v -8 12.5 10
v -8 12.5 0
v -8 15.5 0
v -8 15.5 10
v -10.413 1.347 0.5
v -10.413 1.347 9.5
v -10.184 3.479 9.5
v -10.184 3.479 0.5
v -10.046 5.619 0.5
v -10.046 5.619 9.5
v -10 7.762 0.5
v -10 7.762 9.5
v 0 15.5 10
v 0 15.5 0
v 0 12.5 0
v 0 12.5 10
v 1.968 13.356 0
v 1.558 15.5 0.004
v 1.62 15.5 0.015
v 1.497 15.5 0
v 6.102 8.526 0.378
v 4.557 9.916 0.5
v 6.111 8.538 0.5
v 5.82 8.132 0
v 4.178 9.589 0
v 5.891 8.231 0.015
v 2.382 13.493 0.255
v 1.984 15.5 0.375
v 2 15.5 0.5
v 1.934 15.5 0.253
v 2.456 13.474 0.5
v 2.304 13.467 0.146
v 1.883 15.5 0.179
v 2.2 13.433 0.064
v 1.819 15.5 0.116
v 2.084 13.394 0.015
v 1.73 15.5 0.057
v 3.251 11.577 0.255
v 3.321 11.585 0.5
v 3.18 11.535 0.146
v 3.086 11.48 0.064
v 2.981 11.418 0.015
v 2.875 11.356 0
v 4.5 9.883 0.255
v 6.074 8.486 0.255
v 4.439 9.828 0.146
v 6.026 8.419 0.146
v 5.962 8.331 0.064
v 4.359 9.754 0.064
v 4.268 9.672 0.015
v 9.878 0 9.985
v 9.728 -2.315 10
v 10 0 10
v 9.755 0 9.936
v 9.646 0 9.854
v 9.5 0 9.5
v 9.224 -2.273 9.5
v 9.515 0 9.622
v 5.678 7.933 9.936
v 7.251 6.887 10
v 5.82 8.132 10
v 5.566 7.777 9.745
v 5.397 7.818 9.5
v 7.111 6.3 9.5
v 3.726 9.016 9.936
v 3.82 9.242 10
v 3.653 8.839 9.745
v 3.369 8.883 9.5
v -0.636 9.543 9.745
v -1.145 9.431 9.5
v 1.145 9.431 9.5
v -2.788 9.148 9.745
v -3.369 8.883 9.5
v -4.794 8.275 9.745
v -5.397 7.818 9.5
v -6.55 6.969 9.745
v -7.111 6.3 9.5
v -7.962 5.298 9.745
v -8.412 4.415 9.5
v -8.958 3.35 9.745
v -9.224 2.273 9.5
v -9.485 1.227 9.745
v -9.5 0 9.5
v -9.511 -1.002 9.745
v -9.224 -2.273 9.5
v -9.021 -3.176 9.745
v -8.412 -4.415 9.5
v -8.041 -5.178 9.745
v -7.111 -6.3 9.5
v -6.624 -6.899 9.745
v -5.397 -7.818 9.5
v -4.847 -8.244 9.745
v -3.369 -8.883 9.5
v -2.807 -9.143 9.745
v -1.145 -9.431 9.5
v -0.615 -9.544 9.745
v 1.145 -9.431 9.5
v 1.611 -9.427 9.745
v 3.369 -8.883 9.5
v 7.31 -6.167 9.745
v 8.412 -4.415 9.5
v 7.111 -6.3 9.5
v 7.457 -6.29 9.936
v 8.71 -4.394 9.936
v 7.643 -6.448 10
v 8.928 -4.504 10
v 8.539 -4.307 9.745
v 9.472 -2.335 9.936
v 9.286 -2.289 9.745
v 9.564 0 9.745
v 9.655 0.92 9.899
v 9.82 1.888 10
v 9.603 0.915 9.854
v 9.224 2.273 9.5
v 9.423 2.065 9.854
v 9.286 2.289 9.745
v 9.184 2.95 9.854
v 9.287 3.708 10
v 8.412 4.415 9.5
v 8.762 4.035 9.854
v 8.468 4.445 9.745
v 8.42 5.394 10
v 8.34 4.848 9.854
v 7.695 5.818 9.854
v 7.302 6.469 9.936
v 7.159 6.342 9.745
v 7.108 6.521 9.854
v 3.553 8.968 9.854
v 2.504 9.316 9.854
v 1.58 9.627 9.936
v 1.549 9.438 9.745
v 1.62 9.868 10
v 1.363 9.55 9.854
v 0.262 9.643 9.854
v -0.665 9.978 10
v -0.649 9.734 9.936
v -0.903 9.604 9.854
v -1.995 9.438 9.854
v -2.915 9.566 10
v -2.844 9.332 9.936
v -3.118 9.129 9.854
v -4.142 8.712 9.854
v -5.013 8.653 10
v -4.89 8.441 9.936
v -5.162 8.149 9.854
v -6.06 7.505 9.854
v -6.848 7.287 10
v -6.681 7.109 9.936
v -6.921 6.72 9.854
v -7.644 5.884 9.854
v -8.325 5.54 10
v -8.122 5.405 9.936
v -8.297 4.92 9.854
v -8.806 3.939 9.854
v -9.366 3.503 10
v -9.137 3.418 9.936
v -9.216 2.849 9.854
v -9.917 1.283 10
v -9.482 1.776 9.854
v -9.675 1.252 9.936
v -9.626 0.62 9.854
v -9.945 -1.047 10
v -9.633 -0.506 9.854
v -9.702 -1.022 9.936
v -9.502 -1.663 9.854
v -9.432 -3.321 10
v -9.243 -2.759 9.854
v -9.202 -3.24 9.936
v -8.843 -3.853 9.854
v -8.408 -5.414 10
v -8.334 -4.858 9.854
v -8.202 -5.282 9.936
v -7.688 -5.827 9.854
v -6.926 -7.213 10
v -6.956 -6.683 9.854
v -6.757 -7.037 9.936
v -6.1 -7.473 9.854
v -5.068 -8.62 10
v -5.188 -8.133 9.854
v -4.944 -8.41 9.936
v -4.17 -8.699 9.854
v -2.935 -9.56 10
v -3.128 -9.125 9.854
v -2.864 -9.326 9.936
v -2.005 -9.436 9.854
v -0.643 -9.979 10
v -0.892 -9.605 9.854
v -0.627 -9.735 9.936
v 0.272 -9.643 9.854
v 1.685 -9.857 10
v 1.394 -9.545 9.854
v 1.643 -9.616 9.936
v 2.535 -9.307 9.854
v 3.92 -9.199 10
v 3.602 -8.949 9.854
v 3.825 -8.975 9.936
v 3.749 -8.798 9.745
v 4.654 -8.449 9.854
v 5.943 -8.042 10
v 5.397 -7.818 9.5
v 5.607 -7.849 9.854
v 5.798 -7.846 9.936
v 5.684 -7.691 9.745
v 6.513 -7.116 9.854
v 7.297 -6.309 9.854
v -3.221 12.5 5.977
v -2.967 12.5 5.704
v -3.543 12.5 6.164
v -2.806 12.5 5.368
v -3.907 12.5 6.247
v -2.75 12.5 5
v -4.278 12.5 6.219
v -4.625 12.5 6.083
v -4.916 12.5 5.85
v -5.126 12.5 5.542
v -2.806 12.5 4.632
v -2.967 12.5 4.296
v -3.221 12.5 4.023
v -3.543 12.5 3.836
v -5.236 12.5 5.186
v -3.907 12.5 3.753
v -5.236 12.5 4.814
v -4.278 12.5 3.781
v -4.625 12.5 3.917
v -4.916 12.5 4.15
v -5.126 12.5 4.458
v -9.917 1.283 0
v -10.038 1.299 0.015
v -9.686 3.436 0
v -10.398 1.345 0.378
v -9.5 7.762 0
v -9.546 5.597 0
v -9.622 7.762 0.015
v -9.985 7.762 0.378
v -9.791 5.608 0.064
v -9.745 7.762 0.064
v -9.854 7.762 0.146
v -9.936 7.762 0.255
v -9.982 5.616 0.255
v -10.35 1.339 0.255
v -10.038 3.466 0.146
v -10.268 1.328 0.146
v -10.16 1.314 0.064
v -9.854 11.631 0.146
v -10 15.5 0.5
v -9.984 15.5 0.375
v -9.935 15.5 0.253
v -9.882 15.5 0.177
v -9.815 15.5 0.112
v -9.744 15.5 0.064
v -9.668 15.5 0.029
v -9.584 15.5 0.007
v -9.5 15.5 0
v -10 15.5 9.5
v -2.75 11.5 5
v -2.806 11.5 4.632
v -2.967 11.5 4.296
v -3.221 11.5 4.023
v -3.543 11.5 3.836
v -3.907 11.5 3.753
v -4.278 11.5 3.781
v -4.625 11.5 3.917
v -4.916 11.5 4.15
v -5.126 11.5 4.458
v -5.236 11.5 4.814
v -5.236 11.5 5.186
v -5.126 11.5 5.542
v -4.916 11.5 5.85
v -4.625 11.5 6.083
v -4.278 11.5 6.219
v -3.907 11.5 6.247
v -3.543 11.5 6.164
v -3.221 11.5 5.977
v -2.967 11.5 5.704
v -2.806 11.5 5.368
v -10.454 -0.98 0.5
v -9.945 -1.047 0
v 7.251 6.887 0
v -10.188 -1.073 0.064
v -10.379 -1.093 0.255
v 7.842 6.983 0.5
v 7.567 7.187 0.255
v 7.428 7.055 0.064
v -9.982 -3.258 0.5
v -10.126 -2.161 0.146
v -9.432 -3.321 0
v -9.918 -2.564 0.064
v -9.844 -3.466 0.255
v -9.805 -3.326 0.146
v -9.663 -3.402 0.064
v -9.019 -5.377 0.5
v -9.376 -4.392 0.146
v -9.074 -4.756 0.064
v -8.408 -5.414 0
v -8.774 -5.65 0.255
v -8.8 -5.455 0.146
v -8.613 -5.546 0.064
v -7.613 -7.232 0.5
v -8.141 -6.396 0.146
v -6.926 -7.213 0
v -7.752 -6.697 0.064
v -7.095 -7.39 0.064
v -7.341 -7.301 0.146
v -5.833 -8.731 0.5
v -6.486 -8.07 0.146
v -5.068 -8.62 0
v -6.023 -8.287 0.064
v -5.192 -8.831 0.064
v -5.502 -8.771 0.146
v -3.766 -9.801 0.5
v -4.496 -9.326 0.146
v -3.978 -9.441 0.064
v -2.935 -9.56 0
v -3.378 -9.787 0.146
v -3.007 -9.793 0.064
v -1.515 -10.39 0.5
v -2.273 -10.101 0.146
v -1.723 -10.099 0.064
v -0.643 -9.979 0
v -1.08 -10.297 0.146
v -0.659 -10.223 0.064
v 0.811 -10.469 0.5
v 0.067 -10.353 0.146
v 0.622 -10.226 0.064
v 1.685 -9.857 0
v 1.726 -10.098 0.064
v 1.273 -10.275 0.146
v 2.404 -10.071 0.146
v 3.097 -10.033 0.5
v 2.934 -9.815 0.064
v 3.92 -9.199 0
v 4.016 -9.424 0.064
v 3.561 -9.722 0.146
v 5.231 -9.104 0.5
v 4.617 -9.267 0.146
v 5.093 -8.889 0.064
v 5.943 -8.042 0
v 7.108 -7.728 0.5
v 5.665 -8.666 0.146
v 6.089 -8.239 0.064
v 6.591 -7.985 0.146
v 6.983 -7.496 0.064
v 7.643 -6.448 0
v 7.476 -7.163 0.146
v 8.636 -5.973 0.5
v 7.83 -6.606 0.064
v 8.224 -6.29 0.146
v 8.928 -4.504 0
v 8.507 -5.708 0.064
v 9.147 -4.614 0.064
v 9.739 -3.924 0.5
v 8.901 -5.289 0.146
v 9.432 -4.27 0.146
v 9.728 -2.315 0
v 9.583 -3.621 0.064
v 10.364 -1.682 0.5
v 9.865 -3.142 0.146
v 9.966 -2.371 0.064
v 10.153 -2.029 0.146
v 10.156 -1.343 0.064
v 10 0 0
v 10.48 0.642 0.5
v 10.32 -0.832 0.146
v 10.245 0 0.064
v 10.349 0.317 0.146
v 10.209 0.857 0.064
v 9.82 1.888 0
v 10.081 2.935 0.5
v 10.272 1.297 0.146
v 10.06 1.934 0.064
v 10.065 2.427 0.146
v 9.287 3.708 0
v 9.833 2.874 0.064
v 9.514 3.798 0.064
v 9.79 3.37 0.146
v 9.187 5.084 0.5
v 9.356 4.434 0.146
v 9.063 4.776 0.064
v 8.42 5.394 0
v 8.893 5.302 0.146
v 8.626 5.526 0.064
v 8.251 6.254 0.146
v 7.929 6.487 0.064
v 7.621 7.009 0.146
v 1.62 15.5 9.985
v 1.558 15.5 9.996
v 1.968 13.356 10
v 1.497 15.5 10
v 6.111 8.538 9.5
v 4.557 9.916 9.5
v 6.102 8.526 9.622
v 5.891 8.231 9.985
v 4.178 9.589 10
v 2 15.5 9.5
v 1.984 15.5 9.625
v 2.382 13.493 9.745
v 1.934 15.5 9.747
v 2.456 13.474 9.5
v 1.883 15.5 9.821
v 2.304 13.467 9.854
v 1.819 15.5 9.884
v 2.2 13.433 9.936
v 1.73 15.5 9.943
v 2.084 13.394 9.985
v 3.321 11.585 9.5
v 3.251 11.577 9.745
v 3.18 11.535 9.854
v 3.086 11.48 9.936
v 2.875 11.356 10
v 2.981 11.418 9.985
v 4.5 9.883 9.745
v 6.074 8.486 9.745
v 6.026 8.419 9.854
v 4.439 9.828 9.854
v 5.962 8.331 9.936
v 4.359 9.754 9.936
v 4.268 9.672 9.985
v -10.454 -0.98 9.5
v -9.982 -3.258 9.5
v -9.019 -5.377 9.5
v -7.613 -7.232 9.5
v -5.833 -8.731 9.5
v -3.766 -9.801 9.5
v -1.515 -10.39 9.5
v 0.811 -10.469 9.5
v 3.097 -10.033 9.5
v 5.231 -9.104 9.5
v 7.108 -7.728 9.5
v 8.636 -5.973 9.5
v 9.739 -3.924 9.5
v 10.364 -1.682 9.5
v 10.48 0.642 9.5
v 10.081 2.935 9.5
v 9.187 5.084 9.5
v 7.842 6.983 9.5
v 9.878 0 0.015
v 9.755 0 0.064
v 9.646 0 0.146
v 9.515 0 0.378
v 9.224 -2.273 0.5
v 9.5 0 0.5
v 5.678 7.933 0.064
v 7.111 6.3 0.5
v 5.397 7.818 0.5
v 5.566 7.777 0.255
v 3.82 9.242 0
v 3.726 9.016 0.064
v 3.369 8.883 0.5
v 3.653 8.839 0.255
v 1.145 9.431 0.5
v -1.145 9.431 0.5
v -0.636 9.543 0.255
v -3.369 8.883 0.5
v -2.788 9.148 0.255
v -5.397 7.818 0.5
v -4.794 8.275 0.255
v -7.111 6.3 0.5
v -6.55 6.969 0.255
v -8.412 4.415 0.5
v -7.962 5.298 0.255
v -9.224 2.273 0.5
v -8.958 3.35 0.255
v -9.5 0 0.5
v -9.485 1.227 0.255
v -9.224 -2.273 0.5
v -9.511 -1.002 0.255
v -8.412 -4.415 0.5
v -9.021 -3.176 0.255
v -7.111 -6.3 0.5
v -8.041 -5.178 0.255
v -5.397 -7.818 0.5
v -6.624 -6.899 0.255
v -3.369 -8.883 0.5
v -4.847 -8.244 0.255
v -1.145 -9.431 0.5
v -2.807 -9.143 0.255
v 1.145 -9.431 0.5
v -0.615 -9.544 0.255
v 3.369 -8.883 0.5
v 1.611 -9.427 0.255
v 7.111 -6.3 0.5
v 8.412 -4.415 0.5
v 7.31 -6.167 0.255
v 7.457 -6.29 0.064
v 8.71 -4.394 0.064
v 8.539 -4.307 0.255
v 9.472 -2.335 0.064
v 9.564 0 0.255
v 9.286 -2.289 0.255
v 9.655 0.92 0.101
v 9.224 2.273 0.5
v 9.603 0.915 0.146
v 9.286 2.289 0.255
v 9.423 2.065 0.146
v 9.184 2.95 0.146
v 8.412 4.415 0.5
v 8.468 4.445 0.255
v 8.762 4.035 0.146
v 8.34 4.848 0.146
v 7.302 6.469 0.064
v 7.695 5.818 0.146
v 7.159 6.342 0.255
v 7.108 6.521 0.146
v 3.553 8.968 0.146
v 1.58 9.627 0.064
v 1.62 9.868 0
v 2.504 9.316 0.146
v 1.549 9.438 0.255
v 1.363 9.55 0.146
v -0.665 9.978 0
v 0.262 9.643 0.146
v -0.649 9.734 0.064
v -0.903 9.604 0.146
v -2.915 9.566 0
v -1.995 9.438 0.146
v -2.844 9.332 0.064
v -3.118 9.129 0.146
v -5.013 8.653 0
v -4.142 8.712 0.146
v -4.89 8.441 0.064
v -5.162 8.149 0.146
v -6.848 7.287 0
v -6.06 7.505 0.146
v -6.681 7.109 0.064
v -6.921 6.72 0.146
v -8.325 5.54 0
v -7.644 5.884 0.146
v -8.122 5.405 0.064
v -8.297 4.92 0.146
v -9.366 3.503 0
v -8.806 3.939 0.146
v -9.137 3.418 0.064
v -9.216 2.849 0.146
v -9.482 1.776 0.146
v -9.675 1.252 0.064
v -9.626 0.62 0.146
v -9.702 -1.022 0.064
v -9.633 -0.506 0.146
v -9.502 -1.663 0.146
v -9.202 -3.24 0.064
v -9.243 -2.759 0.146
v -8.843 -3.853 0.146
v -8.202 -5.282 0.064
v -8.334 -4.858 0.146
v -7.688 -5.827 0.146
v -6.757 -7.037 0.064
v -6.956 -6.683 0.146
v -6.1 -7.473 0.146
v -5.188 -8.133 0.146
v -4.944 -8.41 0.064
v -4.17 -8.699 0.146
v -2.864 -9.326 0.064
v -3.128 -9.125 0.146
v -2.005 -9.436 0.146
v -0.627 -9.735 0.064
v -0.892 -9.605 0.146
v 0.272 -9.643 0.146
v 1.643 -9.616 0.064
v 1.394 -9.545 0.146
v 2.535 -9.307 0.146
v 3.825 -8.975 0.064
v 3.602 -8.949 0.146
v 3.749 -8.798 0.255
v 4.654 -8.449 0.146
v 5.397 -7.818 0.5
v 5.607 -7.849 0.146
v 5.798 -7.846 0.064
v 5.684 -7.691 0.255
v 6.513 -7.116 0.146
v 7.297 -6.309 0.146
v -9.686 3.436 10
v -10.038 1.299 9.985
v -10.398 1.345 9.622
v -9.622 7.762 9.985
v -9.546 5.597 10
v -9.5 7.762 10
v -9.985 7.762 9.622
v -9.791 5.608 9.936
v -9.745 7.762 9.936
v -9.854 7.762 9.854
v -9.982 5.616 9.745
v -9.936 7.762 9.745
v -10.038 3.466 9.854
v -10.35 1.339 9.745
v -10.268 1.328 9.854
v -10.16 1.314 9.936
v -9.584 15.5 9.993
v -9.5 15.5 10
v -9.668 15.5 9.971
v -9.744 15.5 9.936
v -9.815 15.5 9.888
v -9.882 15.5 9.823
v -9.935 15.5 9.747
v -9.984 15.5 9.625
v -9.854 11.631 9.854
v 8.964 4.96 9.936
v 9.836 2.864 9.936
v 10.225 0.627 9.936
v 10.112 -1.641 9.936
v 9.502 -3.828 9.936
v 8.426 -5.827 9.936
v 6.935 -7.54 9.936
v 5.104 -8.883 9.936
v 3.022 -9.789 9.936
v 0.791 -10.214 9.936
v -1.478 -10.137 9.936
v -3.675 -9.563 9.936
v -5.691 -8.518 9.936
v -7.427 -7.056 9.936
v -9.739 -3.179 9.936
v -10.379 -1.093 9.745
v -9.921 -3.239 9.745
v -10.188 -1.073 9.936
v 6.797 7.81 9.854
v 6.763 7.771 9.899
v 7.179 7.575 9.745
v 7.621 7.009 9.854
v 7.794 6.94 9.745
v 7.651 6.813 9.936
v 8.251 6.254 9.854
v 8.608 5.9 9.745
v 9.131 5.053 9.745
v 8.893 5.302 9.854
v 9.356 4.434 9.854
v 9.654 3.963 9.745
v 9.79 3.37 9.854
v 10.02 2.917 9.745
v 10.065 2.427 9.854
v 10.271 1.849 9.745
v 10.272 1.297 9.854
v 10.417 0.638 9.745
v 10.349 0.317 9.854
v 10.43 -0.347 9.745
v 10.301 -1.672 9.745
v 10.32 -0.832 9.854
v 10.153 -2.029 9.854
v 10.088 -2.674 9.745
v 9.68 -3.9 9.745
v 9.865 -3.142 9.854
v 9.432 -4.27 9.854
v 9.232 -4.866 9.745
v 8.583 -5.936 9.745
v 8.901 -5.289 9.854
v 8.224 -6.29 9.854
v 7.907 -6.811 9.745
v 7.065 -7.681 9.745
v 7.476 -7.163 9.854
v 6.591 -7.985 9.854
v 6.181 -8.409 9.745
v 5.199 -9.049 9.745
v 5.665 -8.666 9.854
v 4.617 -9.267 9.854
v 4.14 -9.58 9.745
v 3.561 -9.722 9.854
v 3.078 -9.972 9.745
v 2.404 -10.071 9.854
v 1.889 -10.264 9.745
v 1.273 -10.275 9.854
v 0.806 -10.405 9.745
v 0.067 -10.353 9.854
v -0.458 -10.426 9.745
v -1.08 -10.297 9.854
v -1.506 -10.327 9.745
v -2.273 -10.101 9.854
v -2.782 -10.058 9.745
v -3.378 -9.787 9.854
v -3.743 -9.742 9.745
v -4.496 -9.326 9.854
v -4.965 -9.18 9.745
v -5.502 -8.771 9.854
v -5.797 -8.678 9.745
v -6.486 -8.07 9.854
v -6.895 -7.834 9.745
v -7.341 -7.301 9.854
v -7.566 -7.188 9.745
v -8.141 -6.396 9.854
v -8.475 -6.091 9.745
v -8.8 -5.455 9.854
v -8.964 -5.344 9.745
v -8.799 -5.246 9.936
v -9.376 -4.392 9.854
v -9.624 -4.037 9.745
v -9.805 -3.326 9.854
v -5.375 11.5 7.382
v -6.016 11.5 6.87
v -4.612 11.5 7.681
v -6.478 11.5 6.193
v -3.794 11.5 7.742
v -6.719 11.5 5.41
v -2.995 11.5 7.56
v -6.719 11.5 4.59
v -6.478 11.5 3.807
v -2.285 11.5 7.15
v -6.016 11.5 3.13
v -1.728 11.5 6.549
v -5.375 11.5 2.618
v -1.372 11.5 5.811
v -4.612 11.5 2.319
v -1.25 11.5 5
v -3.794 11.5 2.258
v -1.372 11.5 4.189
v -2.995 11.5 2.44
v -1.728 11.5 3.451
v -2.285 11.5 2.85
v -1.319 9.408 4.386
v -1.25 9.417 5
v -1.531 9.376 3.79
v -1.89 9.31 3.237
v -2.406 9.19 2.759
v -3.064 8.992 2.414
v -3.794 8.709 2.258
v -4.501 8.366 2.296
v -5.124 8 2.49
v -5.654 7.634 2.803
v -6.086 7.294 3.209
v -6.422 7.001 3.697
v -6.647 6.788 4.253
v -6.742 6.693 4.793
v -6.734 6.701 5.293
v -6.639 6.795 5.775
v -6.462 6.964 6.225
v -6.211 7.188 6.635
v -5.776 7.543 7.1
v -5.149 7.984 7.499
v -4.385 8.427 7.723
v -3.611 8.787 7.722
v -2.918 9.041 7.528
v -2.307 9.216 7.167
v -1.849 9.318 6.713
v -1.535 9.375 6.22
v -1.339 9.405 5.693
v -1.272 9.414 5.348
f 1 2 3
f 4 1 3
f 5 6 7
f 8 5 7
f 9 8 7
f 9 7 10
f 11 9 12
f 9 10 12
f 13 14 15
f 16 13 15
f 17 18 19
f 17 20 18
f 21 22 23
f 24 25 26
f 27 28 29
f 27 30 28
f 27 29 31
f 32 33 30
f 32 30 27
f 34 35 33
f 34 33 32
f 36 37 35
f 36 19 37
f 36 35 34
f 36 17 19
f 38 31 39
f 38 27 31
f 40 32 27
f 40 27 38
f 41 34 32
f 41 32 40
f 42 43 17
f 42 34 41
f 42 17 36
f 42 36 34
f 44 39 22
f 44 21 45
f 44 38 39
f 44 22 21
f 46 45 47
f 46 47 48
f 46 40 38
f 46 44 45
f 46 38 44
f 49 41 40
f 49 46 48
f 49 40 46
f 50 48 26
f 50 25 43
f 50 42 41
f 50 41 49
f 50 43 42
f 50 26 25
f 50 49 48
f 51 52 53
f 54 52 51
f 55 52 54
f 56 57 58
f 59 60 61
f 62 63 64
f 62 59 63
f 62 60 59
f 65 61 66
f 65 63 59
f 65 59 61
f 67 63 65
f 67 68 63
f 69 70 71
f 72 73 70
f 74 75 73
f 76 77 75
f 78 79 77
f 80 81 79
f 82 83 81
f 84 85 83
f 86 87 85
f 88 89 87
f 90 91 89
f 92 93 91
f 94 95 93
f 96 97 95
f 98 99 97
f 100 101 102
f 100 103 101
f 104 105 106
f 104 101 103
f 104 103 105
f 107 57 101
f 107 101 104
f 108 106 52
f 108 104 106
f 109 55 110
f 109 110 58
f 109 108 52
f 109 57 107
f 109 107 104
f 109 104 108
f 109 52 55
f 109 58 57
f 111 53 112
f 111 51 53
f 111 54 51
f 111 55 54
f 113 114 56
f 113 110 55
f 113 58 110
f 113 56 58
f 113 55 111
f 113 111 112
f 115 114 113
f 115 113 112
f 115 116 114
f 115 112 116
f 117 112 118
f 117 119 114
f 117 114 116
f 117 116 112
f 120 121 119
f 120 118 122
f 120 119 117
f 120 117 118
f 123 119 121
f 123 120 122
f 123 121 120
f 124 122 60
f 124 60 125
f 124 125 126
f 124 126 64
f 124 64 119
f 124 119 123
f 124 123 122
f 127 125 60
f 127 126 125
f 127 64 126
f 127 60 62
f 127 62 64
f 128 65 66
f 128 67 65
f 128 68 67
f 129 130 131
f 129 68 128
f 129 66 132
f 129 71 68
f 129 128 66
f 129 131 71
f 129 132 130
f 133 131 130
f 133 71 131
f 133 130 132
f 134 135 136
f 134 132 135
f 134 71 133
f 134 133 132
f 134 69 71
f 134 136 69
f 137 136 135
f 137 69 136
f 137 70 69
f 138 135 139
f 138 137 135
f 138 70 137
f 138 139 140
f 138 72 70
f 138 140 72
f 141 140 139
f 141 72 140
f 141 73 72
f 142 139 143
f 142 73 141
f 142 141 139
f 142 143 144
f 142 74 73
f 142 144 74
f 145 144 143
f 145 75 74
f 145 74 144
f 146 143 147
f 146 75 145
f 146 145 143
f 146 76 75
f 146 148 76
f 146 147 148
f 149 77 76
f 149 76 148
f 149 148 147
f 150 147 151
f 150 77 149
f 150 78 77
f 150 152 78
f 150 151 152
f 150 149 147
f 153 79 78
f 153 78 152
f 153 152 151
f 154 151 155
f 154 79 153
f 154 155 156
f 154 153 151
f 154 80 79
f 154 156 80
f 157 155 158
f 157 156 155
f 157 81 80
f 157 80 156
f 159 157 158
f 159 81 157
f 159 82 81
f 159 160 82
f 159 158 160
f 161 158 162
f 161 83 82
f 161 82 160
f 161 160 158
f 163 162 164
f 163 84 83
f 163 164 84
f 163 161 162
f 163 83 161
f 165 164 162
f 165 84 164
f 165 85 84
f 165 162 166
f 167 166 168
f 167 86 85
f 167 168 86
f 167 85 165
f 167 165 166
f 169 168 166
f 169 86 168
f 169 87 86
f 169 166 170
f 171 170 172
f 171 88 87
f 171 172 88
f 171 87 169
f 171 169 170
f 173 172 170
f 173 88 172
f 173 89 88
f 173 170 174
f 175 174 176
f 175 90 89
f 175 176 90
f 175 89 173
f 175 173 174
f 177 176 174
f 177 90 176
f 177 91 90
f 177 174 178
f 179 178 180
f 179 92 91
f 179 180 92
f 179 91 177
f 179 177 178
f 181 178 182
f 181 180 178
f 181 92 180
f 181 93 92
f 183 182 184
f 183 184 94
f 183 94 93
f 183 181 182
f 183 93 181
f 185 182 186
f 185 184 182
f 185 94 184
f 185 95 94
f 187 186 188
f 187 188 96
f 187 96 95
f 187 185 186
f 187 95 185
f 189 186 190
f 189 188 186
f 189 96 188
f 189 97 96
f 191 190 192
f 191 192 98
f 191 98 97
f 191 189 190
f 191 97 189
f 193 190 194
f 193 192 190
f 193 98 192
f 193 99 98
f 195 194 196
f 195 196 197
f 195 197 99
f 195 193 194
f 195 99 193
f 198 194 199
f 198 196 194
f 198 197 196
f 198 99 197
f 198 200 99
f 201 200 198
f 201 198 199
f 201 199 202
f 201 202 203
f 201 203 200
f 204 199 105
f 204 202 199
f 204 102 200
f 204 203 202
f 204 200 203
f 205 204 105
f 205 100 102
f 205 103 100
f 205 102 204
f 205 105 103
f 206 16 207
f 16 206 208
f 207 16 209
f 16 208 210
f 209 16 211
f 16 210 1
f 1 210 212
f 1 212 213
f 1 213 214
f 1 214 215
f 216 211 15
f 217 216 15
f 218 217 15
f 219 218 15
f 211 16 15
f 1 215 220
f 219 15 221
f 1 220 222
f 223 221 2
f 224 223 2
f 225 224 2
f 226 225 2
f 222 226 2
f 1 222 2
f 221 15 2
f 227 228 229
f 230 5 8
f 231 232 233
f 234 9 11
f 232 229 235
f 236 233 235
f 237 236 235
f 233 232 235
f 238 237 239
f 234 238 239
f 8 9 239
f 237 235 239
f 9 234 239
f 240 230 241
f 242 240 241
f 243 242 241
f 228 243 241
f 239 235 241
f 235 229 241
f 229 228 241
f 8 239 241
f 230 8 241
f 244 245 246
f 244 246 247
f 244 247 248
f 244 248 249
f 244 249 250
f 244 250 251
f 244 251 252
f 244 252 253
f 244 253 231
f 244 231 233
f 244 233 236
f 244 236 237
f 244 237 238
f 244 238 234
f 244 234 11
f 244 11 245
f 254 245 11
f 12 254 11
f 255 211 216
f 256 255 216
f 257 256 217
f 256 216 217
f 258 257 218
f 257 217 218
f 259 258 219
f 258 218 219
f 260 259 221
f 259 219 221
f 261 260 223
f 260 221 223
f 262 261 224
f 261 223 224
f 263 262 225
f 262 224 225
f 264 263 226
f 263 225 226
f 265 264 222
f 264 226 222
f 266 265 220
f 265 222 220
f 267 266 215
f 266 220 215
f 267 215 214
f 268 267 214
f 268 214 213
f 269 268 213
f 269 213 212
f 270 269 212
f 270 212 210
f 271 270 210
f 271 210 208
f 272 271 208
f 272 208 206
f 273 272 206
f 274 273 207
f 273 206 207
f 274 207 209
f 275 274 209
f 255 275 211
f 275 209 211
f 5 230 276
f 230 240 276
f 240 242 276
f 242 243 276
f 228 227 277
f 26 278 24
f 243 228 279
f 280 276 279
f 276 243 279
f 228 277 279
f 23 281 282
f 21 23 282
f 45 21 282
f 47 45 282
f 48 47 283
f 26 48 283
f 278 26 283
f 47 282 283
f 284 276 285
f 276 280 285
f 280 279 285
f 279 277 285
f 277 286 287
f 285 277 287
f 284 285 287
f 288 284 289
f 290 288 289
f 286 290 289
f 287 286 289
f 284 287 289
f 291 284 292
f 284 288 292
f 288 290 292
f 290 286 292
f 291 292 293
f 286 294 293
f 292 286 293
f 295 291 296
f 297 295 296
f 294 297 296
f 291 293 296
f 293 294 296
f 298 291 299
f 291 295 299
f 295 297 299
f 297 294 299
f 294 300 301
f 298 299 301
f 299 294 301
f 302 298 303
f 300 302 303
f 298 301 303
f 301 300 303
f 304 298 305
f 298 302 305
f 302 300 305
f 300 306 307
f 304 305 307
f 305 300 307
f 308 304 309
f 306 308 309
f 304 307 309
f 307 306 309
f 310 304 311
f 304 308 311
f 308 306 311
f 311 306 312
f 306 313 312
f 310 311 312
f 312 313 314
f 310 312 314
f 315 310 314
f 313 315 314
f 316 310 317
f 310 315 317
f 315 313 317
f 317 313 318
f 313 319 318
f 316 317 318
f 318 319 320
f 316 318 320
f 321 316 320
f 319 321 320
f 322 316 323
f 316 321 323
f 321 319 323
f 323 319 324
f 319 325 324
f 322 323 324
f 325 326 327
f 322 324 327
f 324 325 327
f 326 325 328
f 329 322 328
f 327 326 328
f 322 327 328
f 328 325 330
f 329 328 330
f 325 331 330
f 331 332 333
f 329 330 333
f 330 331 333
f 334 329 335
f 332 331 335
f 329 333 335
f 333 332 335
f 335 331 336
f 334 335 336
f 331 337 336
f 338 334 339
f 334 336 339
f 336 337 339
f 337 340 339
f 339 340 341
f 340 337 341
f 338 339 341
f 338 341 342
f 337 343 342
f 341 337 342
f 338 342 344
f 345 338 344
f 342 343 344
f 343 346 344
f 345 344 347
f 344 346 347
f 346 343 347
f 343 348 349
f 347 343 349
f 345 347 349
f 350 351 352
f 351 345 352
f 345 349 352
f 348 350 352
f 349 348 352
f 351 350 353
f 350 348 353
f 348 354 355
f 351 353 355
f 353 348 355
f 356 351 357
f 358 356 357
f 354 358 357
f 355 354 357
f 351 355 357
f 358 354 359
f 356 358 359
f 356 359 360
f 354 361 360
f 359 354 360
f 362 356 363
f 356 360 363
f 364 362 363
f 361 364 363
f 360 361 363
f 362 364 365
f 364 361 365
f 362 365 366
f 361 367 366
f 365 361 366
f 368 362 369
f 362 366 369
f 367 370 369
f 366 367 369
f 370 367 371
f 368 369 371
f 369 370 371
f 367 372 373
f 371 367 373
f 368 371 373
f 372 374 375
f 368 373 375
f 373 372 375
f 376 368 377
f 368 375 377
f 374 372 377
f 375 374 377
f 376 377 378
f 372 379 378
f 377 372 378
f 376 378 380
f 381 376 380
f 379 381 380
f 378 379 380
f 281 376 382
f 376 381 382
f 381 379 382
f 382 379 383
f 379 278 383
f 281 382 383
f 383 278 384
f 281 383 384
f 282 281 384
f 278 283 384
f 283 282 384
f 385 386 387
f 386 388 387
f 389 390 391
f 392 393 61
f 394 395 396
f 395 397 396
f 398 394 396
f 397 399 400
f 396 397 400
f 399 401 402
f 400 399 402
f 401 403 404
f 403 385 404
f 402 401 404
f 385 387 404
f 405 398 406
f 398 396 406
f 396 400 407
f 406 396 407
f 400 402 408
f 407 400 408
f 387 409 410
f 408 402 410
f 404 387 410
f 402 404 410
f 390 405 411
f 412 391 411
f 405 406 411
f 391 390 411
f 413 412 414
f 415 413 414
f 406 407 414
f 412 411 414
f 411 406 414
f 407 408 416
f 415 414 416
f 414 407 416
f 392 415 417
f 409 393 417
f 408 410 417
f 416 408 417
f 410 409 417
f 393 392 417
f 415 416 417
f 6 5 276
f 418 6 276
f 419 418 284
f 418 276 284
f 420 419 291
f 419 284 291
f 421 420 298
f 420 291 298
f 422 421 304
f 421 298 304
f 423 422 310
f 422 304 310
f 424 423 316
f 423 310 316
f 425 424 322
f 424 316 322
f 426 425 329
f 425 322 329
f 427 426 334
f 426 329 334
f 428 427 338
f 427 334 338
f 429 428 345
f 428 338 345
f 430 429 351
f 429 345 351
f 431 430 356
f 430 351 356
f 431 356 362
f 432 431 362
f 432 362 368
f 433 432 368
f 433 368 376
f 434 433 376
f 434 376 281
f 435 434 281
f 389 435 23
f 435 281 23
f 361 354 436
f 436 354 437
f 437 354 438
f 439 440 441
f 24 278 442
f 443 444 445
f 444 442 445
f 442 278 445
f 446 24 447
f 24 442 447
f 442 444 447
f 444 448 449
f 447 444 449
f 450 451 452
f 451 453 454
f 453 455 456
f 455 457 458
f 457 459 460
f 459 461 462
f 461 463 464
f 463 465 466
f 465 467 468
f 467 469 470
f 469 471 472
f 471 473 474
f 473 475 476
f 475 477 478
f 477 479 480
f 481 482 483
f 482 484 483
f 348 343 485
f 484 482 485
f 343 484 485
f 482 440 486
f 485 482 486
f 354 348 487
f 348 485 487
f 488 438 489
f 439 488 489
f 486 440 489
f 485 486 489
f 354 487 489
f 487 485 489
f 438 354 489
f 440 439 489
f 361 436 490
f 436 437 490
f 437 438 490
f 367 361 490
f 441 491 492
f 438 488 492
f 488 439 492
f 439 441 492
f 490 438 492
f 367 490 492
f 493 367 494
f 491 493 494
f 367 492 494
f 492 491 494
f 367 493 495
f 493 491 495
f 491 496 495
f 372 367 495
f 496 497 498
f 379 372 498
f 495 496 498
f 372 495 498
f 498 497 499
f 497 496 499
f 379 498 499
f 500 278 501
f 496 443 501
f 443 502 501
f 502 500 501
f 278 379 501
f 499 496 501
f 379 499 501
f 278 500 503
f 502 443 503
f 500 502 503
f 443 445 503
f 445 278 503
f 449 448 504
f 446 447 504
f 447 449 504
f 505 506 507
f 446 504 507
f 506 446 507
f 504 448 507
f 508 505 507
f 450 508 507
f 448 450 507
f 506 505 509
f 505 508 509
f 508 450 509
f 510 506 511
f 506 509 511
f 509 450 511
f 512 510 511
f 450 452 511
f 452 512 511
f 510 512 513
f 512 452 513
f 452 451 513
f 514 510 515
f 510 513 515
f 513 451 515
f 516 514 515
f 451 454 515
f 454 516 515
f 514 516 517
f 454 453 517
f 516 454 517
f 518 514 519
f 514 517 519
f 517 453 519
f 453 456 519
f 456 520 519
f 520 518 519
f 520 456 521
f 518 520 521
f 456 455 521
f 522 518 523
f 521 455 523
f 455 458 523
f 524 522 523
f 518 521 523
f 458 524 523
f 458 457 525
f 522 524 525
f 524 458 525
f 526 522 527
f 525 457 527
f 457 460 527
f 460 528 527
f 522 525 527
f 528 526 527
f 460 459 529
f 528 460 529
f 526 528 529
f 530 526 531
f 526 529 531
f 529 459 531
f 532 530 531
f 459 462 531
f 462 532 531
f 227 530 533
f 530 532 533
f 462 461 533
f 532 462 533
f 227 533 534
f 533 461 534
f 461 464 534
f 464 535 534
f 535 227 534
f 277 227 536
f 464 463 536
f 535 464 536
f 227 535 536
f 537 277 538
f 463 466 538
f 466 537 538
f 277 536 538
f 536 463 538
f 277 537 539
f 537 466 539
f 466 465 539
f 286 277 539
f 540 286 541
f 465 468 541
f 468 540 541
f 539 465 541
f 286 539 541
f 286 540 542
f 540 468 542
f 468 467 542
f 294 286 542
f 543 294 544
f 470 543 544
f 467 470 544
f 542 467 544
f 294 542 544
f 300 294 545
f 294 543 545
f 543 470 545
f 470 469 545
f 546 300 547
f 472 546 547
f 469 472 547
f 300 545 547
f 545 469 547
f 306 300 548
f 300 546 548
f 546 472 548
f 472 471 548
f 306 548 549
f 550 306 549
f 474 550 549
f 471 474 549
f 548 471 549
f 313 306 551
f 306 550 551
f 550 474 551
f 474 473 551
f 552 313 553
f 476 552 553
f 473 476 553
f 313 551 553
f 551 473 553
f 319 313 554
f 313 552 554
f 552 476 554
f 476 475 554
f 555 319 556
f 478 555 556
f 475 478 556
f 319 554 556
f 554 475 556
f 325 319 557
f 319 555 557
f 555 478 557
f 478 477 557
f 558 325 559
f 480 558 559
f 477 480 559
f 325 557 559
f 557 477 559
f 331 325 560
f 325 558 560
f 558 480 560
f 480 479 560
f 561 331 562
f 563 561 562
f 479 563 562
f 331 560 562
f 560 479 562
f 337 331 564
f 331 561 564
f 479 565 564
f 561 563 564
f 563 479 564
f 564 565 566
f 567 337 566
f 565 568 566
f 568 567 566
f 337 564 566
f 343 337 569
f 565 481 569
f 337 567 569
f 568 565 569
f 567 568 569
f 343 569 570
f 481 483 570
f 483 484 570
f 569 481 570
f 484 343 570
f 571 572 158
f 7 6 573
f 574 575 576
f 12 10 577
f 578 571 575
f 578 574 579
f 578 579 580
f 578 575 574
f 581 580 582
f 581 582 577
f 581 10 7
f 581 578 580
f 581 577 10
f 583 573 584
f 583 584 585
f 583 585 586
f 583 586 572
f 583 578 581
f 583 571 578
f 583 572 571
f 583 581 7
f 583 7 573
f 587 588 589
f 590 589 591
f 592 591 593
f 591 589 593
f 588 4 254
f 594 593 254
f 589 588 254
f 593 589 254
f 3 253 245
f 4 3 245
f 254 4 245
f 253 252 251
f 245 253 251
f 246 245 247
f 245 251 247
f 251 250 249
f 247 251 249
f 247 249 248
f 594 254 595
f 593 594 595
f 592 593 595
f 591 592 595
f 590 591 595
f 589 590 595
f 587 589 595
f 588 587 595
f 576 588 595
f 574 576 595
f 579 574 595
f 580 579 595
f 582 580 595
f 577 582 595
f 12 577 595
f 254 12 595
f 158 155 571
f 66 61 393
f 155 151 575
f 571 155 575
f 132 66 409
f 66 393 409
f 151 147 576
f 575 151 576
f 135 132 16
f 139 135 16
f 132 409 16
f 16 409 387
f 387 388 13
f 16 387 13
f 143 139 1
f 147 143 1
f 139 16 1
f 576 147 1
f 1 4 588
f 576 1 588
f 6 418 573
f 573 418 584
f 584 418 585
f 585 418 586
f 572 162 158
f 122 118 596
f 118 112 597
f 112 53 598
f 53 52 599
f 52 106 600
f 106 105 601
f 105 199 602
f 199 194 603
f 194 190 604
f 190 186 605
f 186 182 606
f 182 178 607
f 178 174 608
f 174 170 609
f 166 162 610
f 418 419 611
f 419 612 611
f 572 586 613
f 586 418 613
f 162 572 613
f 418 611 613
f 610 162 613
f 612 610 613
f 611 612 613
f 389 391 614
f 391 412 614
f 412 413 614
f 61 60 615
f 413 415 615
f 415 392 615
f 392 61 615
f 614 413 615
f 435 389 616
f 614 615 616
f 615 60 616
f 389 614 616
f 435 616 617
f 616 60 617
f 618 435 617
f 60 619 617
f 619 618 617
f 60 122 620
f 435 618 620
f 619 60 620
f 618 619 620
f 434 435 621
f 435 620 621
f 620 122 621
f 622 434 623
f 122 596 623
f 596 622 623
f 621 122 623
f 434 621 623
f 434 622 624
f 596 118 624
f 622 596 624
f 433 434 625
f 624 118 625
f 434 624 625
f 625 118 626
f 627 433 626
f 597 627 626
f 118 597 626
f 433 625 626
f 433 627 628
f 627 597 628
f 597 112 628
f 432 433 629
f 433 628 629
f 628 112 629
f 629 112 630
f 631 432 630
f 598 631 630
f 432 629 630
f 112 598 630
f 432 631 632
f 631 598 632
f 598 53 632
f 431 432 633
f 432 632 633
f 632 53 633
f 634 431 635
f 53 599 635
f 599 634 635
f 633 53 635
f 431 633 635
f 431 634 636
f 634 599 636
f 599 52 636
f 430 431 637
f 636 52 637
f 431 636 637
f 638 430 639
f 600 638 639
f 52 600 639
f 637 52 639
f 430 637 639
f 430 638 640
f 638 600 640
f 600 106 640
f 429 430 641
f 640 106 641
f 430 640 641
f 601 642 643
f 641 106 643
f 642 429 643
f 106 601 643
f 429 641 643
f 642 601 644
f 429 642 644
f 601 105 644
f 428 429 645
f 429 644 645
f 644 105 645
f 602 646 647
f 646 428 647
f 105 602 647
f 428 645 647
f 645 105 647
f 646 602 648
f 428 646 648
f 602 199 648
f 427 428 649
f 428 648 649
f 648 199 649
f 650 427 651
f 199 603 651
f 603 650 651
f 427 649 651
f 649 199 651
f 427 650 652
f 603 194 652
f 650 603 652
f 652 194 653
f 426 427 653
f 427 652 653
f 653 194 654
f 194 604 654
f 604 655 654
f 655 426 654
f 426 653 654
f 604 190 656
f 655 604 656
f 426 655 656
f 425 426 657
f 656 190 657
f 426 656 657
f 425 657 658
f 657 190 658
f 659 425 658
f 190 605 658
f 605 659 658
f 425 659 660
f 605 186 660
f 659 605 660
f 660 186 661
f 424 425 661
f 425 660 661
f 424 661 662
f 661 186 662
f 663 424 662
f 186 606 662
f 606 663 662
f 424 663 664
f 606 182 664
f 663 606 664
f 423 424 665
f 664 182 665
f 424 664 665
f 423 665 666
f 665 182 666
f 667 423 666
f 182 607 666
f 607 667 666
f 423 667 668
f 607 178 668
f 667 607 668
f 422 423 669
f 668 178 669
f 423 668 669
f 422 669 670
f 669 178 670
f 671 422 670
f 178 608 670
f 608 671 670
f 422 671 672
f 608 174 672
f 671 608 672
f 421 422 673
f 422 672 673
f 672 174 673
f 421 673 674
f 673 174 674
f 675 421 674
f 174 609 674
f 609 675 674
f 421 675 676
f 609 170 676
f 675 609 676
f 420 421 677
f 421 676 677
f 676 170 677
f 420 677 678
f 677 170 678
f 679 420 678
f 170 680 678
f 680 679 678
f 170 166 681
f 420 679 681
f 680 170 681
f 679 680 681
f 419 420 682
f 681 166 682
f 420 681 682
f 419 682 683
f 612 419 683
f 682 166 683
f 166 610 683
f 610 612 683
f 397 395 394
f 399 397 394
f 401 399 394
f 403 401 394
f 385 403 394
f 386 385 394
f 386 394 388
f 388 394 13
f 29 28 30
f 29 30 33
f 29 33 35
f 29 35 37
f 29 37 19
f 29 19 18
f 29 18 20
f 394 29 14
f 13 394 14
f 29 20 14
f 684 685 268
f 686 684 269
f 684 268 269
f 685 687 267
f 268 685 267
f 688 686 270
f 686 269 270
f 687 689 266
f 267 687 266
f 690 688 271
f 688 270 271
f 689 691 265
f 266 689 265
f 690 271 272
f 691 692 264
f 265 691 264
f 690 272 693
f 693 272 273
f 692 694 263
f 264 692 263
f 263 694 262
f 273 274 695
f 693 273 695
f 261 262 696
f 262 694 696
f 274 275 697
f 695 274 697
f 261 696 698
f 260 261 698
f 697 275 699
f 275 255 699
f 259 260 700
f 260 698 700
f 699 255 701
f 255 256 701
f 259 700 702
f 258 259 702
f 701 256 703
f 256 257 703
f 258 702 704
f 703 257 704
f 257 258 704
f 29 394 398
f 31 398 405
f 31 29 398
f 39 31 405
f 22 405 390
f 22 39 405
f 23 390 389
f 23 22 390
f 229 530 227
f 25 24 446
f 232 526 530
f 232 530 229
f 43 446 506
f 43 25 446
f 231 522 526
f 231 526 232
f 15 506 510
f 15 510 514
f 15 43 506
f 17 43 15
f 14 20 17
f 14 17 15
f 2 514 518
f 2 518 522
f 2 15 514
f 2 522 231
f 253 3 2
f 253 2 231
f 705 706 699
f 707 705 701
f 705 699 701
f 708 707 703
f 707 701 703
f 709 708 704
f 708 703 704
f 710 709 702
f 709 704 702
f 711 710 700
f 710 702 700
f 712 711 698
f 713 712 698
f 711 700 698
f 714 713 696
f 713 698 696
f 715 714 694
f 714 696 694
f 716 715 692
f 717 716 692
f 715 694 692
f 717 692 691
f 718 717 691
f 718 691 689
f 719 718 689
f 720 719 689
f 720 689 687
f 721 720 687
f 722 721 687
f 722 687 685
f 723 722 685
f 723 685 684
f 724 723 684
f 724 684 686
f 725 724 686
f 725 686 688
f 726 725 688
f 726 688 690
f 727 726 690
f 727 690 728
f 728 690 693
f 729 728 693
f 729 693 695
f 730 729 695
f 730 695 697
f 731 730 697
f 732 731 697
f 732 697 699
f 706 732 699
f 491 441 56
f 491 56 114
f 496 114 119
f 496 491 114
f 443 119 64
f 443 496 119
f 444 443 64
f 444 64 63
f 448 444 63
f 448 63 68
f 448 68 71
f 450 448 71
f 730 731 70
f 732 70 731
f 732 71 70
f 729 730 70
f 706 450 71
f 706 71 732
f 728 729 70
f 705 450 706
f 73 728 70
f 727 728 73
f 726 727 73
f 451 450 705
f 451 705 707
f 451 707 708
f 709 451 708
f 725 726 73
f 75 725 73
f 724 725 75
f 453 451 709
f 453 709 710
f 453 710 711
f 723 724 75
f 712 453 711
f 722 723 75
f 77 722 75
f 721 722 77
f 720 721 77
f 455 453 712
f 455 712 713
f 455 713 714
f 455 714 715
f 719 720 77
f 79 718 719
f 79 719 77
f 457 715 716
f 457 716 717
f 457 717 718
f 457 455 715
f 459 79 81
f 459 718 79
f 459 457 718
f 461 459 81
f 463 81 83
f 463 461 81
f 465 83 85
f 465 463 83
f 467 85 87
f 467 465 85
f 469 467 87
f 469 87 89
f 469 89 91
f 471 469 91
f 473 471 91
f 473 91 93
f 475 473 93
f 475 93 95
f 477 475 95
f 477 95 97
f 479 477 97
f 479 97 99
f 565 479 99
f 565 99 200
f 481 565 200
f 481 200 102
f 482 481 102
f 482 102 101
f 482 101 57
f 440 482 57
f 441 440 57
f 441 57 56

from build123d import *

# Parameters (mm, degrees)
SKETCH1_R              = 10.5
SKETCH1_R_2            = 9.5
BOSS_EXTRUDE1_DEPTH    = 10
FILLET1_R              = 50
FILLET2_R              = 10
M3_TAPPED_HOLE1_REACH  = 29.189
M3_TAPPED_HOLE1_BORE_R = 1.25
FILLET3_SIZE           = 0.5
CUT_EXTRUDE1_START     = 9
SKETCH4_R              = 2.75
SKETCH4_R_2            = 1.25
CUT_EXTRUDE1_DEPTH     = 9


with BuildPart() as part:
    # Sketch1 → Boss-Extrude1 (new body)
    # profile 1 of 2: a face of its own
    with BuildSketch(Plane.XY):
        with BuildLine():
            Line((-8, 15.5), (-10, 15.5))
            Line((-10, 15.5), (-10, 3.201562119))
            ThreePointArc((-10, 3.201562119), (-5.350189391, 9.034681703), (2, 10.307764064))
            Line((2, 10.307764064), (2, 15.5))
            Line((2, 15.5), (0, 15.5))
            Line((0, 15.5), (0, 12.5))
            Line((0, 12.5), (-8, 12.5))
            Line((-8, 12.5), (-8, 15.5))
        make_face()
    # profile 2 of 2: a face of its own
    with BuildSketch(Plane.XY):
        Circle(SKETCH1_R)
        Circle(SKETCH1_R_2, mode=Mode.SUBTRACT)
    extrude(amount=BOSS_EXTRUDE1_DEPTH)

    # Fillet1
    fillet1_edges = [part.edges().sort_by_distance(p)[0] for p in [
        (-10, 3.201562119, 5),
    ]]
    fillet(fillet1_edges, radius=FILLET1_R)

    # Fillet2
    # the kernel refuses this fillet: 10 mm, written as the material it adds along each edge
    with BuildSketch(Plane(origin=(2, 10.307764064, 0), x_dir=(0.9185397439209221, -0.39532864661909706, 0), z_dir=(0, 0, 1))) as fillet2_piece_1:
        with BuildLine():
            CenterArc((6.607059315, 9.770236435), FILLET2_R, 210.006360565, 47.687742379)
            Line((-2.052639605, 4.769275067), (-2.225833584, 4.66925584))
            ThreePointArc((-2.225833584, 4.66925584), (-1.210027752, 2.305571804), (-0.183707949, -0.079065729))
            Line((-0.183707949, -0.079065729), (0.042626189, -0.195404729))
            ThreePointArc((0.042626189, -0.195404729), (2.237874929, 0.041251743), (4.433123669, -0.195404729))
            Line((4.433123669, -0.195404729), (4.475749859, 0))
        make_face()
    extrude(amount=10)

    # M3 Tapped Hole1 bore → M3 Tapped Hole1 (cut, up to next)
    with BuildSketch(Plane(origin=(0, 12.5, 0), x_dir=(1, 0, 0), z_dir=(0, 1, 0)), mode=Mode.PRIVATE) as m3_tapped_hole1_sk1:
        with Locations((-4, -5)):
            Circle(M3_TAPPED_HOLE1_BORE_R)
    m3_tapped_hole1_tool1 = extrude(m3_tapped_hole1_sk1.sketch, amount=-M3_TAPPED_HOLE1_REACH, mode=Mode.PRIVATE) & part.part
    add(m3_tapped_hole1_tool1.solids().sort_by_distance((-4, 12.5, 5))[0], mode=Mode.SUBTRACT)

    # Fillet3
    # a fillet whose section is not a circle: 0.5 mm, written as the material it takes off along each edge
    with BuildSketch(Plane(origin=(0, 0, 0), x_dir=(1, 0, 0), z_dir=(0, -1, 0))) as fillet3_piece_1:
        with BuildLine():
            Bezier((9.5 + FILLET3_SIZE, 0), (9.5, 0), (9.5, FILLET3_SIZE), weights=[1, 0.707106781, 1])
            Line((9.5, FILLET3_SIZE), (9.5, 0))
            Line((9.5, 0), (9.5 + FILLET3_SIZE, 0))
        make_face()
    revolve(axis=Axis((0, 0, 0), (0, 0, 1)), mode=Mode.SUBTRACT)
    with BuildSketch(Plane(origin=(-10, 16.75, 0), x_dir=(1, 0, 0), z_dir=(0, -1, 0))) as fillet3_piece_2:
        with BuildLine():
            Bezier((FILLET3_SIZE, 0), (0, 0), (0, FILLET3_SIZE), weights=[1, 0.707106781, 1])
            Line((0, FILLET3_SIZE), (0, 0))
            Line((0, 0), (FILLET3_SIZE, 0))
        make_face()
    extrude(amount=8.987912652, mode=Mode.SUBTRACT)
    with BuildSketch(Plane(origin=(0, 0, 0), x_dir=(-0.9917355371900827, 0.12829896443190072, 0), z_dir=(0.12829896443190072, 0.9917355371900827, 0))) as fillet3_piece_3:
        with BuildLine():
            Bezier((10.5, FILLET3_SIZE), (10.5, 0), (10.5 - FILLET3_SIZE, 0), weights=[1, 0.707106781, 1])
            Line((10.5 - FILLET3_SIZE, 0), (10.5, 0))
            Line((10.5, 0), (10.5, FILLET3_SIZE))
        make_face()
    revolve(axis=Axis((0, 0, 0), (0, 0, 1)), revolution_arc=241.77893748, mode=Mode.SUBTRACT)
    with BuildSketch(Plane(origin=(0, 0, 10), x_dir=(0.5820146789437495, 0.8131782790348032, 0), z_dir=(-0.8131782790348032, 0.5820146789437495, 0))) as fillet3_piece_4:
        with BuildLine():
            Bezier((10.5, FILLET3_SIZE), (10.5, 0), (10.5 - FILLET3_SIZE, 0), weights=[1, 0.707106781, 1])
            Line((10.5 - FILLET3_SIZE, 0), (10.5, 0))
            Line((10.5, 0), (10.5, FILLET3_SIZE))
        make_face()
    revolve(axis=Axis((0, 0, 10), (0, 0, -1)), revolution_arc=241.77893748, mode=Mode.SUBTRACT)
    with BuildSketch(Plane(origin=(-60, 7.762087348, 0), x_dir=(0.9917355371900826, -0.1282989644319008, 0), z_dir=(-0.1282989644319008, -0.9917355371900826, 0))) as fillet3_piece_5:
        with BuildLine():
            Bezier((50 + FILLET3_SIZE, 0), (50, 0), (50, FILLET3_SIZE), weights=[1, 0.707106781, 1])
            Line((50, FILLET3_SIZE), (50, 0))
            Line((50, 0), (50 + FILLET3_SIZE, 0))
        make_face()
    revolve(axis=Axis((-60, 7.762087348, 0), (0, 0, 1)), revolution_arc=7.371307019, mode=Mode.SUBTRACT)
    with BuildSketch(Plane(origin=(-60, 7.762087348, 10), x_dir=(0.9917355371900826, -0.1282989644319008, 0), z_dir=(-0.1282989644319008, -0.9917355371900826, 0))) as fillet3_piece_6:
        with BuildLine():
            Bezier((50 + FILLET3_SIZE, 0), (50, 0), (50, -FILLET3_SIZE), weights=[1, 0.707106781, 1])
            Line((50, -FILLET3_SIZE), (50, 0))
            Line((50, 0), (50 + FILLET3_SIZE, 0))
        make_face()
    revolve(axis=Axis((-60, 7.762087348, 10), (0, 0, 1)), revolution_arc=7.371307019, mode=Mode.SUBTRACT)
    with BuildSketch(Plane(origin=(11.931300918, 16.67015472, 0), x_dir=(-0.999970124297953, 0.0077298455053398385, 0), z_dir=(0.0077298455053398385, 0.999970124297953, 0))) as fillet3_piece_7:
        with BuildLine():
            Bezier((10, FILLET3_SIZE), (10, 0), (10 + FILLET3_SIZE, 0), weights=[1, 0.707106781, 1])
            Line((10 + FILLET3_SIZE, 0), (10, 0))
            Line((10, 0), (10, FILLET3_SIZE))
        make_face()
    revolve(axis=Axis((11.931300918, 16.67015472, 0), (0, 0, 1)), revolution_arc=54.850522395, mode=Mode.SUBTRACT)
    with BuildSketch(Plane(origin=(11.931300918, 16.67015472, 10), x_dir=(-0.999970124297953, 0.0077298455053398385, 0), z_dir=(0.0077298455053398385, 0.999970124297953, 0))) as fillet3_piece_8:
        with BuildLine():
            Bezier((10, -FILLET3_SIZE), (10, 0), (10 + FILLET3_SIZE, 0), weights=[1, 0.707106781, 1])
            Line((10 + FILLET3_SIZE, 0), (10, 0))
            Line((10, 0), (10, -FILLET3_SIZE))
        make_face()
    revolve(axis=Axis((11.931300918, 16.67015472, 10), (0, 0, 1)), revolution_arc=54.850522395, mode=Mode.SUBTRACT)
    with BuildSketch(Plane(origin=(0, 0, 10), x_dir=(1, 0, 0), z_dir=(0, -1, 0))) as fillet3_piece_9:
        with BuildLine():
            Bezier((9.5 + FILLET3_SIZE, 0), (9.5, 0), (9.5, -FILLET3_SIZE), weights=[1, 0.707106781, 1])
            Line((9.5, -FILLET3_SIZE), (9.5, 0))
            Line((9.5, 0), (9.5 + FILLET3_SIZE, 0))
        make_face()
    revolve(axis=Axis((0, 0, 10), (0, 0, 1)), mode=Mode.SUBTRACT)
    with BuildSketch(Plane(origin=(-10, 16.75, 10), x_dir=(1, 0, 0), z_dir=(0, -1, 0))) as fillet3_piece_10:
        with BuildLine():
            Bezier((FILLET3_SIZE, 0), (0, 0), (0, -FILLET3_SIZE), weights=[1, 0.707106781, 1])
            Line((0, -FILLET3_SIZE), (0, 0))
            Line((0, 0), (FILLET3_SIZE, 0))
        make_face()
    extrude(amount=8.987912652, mode=Mode.SUBTRACT)

    # Sketch4 → Cut-Extrude1 (cut)
    with BuildSketch(Plane(origin=(0, 2.5, 0), x_dir=(1, 0, 0), z_dir=(0, 1, 0)).offset(CUT_EXTRUDE1_START)):
        with Locations((-4, -5)):
            Circle(SKETCH4_R)
        with Locations(Location((-4, -5, 0), (0, 0, 270))):
            Circle(SKETCH4_R_2, mode=Mode.SUBTRACT)
    extrude(amount=-CUT_EXTRUDE1_DEPTH, mode=Mode.SUBTRACT)


solid = part.part
